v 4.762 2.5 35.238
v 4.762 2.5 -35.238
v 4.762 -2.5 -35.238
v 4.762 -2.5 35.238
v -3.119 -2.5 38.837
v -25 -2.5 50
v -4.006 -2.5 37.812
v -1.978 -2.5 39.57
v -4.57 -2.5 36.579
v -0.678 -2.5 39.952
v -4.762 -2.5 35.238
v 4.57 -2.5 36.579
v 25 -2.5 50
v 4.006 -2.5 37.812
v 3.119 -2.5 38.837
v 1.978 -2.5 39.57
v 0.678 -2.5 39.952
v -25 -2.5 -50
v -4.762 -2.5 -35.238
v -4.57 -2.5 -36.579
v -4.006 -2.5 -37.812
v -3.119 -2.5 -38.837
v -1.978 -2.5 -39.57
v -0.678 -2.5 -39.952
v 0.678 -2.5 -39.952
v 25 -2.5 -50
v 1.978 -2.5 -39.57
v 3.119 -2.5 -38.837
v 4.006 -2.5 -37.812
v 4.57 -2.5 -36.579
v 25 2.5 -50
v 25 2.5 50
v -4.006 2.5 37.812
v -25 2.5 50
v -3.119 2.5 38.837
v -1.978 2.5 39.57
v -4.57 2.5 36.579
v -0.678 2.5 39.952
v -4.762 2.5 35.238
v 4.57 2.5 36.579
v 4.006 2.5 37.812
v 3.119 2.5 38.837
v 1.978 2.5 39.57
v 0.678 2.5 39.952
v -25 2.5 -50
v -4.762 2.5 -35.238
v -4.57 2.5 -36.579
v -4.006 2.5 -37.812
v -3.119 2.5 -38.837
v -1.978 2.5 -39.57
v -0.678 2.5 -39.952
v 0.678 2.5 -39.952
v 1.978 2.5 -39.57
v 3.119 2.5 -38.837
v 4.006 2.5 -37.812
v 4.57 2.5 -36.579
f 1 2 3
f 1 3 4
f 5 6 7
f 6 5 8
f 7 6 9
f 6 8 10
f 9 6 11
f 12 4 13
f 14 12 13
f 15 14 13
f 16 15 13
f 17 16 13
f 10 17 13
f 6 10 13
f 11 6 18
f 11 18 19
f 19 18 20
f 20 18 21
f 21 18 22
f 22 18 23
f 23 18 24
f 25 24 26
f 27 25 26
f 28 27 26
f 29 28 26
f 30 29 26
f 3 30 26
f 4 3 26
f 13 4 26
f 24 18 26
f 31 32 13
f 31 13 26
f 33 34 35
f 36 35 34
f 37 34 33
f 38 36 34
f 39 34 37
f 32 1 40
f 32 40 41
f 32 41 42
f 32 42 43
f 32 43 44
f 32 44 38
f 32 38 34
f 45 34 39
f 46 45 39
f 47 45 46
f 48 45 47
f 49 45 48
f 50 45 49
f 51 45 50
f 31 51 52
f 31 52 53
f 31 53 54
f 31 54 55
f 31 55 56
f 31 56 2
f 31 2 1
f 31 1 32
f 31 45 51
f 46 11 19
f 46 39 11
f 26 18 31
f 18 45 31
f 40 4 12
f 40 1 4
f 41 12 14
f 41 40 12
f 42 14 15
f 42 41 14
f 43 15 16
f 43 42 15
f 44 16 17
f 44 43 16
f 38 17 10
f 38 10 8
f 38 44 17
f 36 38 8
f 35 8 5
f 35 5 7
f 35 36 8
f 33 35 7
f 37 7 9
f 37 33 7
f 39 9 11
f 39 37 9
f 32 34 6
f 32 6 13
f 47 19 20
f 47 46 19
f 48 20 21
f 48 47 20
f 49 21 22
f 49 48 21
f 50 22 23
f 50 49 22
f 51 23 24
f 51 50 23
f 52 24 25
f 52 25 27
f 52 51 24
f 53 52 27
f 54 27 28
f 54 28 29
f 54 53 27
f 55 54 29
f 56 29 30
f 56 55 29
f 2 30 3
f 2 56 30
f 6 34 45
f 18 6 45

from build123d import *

# Parameters (mm, degrees)
BOSS_EXTRUDE1_DEPTH      = 2.5
BOSS_EXTRUDE1_DEPTH_BACK = 2.5
SKETCH1_W                = 50
SKETCH1_H                = 100


with BuildPart() as part:
    # Sketch1 → Boss-Extrude1 (new, two sides: drawn at the far end of the back side and taken through both)
    with BuildSketch(Plane(origin=(0, 0, 0), x_dir=(1, 0, 0), z_dir=(0, 1, 0)).offset(-BOSS_EXTRUDE1_DEPTH_BACK)):
        Rectangle(SKETCH1_W, SKETCH1_H)
        with BuildLine():
            Line((4.7625, 35.2375), (4.7625, -35.2375))
            ThreePointArc((4.7625, -35.2375), (0, -40), (-4.7625, -35.2375))
            Line((-4.7625, -35.2375), (-4.7625, 35.2375))
            ThreePointArc((-4.7625, 35.2375), (0, 40), (4.7625, 35.2375))
        make_face(mode=Mode.SUBTRACT)
    extrude(amount=BOSS_EXTRUDE1_DEPTH + BOSS_EXTRUDE1_DEPTH_BACK)


solid = part.part
